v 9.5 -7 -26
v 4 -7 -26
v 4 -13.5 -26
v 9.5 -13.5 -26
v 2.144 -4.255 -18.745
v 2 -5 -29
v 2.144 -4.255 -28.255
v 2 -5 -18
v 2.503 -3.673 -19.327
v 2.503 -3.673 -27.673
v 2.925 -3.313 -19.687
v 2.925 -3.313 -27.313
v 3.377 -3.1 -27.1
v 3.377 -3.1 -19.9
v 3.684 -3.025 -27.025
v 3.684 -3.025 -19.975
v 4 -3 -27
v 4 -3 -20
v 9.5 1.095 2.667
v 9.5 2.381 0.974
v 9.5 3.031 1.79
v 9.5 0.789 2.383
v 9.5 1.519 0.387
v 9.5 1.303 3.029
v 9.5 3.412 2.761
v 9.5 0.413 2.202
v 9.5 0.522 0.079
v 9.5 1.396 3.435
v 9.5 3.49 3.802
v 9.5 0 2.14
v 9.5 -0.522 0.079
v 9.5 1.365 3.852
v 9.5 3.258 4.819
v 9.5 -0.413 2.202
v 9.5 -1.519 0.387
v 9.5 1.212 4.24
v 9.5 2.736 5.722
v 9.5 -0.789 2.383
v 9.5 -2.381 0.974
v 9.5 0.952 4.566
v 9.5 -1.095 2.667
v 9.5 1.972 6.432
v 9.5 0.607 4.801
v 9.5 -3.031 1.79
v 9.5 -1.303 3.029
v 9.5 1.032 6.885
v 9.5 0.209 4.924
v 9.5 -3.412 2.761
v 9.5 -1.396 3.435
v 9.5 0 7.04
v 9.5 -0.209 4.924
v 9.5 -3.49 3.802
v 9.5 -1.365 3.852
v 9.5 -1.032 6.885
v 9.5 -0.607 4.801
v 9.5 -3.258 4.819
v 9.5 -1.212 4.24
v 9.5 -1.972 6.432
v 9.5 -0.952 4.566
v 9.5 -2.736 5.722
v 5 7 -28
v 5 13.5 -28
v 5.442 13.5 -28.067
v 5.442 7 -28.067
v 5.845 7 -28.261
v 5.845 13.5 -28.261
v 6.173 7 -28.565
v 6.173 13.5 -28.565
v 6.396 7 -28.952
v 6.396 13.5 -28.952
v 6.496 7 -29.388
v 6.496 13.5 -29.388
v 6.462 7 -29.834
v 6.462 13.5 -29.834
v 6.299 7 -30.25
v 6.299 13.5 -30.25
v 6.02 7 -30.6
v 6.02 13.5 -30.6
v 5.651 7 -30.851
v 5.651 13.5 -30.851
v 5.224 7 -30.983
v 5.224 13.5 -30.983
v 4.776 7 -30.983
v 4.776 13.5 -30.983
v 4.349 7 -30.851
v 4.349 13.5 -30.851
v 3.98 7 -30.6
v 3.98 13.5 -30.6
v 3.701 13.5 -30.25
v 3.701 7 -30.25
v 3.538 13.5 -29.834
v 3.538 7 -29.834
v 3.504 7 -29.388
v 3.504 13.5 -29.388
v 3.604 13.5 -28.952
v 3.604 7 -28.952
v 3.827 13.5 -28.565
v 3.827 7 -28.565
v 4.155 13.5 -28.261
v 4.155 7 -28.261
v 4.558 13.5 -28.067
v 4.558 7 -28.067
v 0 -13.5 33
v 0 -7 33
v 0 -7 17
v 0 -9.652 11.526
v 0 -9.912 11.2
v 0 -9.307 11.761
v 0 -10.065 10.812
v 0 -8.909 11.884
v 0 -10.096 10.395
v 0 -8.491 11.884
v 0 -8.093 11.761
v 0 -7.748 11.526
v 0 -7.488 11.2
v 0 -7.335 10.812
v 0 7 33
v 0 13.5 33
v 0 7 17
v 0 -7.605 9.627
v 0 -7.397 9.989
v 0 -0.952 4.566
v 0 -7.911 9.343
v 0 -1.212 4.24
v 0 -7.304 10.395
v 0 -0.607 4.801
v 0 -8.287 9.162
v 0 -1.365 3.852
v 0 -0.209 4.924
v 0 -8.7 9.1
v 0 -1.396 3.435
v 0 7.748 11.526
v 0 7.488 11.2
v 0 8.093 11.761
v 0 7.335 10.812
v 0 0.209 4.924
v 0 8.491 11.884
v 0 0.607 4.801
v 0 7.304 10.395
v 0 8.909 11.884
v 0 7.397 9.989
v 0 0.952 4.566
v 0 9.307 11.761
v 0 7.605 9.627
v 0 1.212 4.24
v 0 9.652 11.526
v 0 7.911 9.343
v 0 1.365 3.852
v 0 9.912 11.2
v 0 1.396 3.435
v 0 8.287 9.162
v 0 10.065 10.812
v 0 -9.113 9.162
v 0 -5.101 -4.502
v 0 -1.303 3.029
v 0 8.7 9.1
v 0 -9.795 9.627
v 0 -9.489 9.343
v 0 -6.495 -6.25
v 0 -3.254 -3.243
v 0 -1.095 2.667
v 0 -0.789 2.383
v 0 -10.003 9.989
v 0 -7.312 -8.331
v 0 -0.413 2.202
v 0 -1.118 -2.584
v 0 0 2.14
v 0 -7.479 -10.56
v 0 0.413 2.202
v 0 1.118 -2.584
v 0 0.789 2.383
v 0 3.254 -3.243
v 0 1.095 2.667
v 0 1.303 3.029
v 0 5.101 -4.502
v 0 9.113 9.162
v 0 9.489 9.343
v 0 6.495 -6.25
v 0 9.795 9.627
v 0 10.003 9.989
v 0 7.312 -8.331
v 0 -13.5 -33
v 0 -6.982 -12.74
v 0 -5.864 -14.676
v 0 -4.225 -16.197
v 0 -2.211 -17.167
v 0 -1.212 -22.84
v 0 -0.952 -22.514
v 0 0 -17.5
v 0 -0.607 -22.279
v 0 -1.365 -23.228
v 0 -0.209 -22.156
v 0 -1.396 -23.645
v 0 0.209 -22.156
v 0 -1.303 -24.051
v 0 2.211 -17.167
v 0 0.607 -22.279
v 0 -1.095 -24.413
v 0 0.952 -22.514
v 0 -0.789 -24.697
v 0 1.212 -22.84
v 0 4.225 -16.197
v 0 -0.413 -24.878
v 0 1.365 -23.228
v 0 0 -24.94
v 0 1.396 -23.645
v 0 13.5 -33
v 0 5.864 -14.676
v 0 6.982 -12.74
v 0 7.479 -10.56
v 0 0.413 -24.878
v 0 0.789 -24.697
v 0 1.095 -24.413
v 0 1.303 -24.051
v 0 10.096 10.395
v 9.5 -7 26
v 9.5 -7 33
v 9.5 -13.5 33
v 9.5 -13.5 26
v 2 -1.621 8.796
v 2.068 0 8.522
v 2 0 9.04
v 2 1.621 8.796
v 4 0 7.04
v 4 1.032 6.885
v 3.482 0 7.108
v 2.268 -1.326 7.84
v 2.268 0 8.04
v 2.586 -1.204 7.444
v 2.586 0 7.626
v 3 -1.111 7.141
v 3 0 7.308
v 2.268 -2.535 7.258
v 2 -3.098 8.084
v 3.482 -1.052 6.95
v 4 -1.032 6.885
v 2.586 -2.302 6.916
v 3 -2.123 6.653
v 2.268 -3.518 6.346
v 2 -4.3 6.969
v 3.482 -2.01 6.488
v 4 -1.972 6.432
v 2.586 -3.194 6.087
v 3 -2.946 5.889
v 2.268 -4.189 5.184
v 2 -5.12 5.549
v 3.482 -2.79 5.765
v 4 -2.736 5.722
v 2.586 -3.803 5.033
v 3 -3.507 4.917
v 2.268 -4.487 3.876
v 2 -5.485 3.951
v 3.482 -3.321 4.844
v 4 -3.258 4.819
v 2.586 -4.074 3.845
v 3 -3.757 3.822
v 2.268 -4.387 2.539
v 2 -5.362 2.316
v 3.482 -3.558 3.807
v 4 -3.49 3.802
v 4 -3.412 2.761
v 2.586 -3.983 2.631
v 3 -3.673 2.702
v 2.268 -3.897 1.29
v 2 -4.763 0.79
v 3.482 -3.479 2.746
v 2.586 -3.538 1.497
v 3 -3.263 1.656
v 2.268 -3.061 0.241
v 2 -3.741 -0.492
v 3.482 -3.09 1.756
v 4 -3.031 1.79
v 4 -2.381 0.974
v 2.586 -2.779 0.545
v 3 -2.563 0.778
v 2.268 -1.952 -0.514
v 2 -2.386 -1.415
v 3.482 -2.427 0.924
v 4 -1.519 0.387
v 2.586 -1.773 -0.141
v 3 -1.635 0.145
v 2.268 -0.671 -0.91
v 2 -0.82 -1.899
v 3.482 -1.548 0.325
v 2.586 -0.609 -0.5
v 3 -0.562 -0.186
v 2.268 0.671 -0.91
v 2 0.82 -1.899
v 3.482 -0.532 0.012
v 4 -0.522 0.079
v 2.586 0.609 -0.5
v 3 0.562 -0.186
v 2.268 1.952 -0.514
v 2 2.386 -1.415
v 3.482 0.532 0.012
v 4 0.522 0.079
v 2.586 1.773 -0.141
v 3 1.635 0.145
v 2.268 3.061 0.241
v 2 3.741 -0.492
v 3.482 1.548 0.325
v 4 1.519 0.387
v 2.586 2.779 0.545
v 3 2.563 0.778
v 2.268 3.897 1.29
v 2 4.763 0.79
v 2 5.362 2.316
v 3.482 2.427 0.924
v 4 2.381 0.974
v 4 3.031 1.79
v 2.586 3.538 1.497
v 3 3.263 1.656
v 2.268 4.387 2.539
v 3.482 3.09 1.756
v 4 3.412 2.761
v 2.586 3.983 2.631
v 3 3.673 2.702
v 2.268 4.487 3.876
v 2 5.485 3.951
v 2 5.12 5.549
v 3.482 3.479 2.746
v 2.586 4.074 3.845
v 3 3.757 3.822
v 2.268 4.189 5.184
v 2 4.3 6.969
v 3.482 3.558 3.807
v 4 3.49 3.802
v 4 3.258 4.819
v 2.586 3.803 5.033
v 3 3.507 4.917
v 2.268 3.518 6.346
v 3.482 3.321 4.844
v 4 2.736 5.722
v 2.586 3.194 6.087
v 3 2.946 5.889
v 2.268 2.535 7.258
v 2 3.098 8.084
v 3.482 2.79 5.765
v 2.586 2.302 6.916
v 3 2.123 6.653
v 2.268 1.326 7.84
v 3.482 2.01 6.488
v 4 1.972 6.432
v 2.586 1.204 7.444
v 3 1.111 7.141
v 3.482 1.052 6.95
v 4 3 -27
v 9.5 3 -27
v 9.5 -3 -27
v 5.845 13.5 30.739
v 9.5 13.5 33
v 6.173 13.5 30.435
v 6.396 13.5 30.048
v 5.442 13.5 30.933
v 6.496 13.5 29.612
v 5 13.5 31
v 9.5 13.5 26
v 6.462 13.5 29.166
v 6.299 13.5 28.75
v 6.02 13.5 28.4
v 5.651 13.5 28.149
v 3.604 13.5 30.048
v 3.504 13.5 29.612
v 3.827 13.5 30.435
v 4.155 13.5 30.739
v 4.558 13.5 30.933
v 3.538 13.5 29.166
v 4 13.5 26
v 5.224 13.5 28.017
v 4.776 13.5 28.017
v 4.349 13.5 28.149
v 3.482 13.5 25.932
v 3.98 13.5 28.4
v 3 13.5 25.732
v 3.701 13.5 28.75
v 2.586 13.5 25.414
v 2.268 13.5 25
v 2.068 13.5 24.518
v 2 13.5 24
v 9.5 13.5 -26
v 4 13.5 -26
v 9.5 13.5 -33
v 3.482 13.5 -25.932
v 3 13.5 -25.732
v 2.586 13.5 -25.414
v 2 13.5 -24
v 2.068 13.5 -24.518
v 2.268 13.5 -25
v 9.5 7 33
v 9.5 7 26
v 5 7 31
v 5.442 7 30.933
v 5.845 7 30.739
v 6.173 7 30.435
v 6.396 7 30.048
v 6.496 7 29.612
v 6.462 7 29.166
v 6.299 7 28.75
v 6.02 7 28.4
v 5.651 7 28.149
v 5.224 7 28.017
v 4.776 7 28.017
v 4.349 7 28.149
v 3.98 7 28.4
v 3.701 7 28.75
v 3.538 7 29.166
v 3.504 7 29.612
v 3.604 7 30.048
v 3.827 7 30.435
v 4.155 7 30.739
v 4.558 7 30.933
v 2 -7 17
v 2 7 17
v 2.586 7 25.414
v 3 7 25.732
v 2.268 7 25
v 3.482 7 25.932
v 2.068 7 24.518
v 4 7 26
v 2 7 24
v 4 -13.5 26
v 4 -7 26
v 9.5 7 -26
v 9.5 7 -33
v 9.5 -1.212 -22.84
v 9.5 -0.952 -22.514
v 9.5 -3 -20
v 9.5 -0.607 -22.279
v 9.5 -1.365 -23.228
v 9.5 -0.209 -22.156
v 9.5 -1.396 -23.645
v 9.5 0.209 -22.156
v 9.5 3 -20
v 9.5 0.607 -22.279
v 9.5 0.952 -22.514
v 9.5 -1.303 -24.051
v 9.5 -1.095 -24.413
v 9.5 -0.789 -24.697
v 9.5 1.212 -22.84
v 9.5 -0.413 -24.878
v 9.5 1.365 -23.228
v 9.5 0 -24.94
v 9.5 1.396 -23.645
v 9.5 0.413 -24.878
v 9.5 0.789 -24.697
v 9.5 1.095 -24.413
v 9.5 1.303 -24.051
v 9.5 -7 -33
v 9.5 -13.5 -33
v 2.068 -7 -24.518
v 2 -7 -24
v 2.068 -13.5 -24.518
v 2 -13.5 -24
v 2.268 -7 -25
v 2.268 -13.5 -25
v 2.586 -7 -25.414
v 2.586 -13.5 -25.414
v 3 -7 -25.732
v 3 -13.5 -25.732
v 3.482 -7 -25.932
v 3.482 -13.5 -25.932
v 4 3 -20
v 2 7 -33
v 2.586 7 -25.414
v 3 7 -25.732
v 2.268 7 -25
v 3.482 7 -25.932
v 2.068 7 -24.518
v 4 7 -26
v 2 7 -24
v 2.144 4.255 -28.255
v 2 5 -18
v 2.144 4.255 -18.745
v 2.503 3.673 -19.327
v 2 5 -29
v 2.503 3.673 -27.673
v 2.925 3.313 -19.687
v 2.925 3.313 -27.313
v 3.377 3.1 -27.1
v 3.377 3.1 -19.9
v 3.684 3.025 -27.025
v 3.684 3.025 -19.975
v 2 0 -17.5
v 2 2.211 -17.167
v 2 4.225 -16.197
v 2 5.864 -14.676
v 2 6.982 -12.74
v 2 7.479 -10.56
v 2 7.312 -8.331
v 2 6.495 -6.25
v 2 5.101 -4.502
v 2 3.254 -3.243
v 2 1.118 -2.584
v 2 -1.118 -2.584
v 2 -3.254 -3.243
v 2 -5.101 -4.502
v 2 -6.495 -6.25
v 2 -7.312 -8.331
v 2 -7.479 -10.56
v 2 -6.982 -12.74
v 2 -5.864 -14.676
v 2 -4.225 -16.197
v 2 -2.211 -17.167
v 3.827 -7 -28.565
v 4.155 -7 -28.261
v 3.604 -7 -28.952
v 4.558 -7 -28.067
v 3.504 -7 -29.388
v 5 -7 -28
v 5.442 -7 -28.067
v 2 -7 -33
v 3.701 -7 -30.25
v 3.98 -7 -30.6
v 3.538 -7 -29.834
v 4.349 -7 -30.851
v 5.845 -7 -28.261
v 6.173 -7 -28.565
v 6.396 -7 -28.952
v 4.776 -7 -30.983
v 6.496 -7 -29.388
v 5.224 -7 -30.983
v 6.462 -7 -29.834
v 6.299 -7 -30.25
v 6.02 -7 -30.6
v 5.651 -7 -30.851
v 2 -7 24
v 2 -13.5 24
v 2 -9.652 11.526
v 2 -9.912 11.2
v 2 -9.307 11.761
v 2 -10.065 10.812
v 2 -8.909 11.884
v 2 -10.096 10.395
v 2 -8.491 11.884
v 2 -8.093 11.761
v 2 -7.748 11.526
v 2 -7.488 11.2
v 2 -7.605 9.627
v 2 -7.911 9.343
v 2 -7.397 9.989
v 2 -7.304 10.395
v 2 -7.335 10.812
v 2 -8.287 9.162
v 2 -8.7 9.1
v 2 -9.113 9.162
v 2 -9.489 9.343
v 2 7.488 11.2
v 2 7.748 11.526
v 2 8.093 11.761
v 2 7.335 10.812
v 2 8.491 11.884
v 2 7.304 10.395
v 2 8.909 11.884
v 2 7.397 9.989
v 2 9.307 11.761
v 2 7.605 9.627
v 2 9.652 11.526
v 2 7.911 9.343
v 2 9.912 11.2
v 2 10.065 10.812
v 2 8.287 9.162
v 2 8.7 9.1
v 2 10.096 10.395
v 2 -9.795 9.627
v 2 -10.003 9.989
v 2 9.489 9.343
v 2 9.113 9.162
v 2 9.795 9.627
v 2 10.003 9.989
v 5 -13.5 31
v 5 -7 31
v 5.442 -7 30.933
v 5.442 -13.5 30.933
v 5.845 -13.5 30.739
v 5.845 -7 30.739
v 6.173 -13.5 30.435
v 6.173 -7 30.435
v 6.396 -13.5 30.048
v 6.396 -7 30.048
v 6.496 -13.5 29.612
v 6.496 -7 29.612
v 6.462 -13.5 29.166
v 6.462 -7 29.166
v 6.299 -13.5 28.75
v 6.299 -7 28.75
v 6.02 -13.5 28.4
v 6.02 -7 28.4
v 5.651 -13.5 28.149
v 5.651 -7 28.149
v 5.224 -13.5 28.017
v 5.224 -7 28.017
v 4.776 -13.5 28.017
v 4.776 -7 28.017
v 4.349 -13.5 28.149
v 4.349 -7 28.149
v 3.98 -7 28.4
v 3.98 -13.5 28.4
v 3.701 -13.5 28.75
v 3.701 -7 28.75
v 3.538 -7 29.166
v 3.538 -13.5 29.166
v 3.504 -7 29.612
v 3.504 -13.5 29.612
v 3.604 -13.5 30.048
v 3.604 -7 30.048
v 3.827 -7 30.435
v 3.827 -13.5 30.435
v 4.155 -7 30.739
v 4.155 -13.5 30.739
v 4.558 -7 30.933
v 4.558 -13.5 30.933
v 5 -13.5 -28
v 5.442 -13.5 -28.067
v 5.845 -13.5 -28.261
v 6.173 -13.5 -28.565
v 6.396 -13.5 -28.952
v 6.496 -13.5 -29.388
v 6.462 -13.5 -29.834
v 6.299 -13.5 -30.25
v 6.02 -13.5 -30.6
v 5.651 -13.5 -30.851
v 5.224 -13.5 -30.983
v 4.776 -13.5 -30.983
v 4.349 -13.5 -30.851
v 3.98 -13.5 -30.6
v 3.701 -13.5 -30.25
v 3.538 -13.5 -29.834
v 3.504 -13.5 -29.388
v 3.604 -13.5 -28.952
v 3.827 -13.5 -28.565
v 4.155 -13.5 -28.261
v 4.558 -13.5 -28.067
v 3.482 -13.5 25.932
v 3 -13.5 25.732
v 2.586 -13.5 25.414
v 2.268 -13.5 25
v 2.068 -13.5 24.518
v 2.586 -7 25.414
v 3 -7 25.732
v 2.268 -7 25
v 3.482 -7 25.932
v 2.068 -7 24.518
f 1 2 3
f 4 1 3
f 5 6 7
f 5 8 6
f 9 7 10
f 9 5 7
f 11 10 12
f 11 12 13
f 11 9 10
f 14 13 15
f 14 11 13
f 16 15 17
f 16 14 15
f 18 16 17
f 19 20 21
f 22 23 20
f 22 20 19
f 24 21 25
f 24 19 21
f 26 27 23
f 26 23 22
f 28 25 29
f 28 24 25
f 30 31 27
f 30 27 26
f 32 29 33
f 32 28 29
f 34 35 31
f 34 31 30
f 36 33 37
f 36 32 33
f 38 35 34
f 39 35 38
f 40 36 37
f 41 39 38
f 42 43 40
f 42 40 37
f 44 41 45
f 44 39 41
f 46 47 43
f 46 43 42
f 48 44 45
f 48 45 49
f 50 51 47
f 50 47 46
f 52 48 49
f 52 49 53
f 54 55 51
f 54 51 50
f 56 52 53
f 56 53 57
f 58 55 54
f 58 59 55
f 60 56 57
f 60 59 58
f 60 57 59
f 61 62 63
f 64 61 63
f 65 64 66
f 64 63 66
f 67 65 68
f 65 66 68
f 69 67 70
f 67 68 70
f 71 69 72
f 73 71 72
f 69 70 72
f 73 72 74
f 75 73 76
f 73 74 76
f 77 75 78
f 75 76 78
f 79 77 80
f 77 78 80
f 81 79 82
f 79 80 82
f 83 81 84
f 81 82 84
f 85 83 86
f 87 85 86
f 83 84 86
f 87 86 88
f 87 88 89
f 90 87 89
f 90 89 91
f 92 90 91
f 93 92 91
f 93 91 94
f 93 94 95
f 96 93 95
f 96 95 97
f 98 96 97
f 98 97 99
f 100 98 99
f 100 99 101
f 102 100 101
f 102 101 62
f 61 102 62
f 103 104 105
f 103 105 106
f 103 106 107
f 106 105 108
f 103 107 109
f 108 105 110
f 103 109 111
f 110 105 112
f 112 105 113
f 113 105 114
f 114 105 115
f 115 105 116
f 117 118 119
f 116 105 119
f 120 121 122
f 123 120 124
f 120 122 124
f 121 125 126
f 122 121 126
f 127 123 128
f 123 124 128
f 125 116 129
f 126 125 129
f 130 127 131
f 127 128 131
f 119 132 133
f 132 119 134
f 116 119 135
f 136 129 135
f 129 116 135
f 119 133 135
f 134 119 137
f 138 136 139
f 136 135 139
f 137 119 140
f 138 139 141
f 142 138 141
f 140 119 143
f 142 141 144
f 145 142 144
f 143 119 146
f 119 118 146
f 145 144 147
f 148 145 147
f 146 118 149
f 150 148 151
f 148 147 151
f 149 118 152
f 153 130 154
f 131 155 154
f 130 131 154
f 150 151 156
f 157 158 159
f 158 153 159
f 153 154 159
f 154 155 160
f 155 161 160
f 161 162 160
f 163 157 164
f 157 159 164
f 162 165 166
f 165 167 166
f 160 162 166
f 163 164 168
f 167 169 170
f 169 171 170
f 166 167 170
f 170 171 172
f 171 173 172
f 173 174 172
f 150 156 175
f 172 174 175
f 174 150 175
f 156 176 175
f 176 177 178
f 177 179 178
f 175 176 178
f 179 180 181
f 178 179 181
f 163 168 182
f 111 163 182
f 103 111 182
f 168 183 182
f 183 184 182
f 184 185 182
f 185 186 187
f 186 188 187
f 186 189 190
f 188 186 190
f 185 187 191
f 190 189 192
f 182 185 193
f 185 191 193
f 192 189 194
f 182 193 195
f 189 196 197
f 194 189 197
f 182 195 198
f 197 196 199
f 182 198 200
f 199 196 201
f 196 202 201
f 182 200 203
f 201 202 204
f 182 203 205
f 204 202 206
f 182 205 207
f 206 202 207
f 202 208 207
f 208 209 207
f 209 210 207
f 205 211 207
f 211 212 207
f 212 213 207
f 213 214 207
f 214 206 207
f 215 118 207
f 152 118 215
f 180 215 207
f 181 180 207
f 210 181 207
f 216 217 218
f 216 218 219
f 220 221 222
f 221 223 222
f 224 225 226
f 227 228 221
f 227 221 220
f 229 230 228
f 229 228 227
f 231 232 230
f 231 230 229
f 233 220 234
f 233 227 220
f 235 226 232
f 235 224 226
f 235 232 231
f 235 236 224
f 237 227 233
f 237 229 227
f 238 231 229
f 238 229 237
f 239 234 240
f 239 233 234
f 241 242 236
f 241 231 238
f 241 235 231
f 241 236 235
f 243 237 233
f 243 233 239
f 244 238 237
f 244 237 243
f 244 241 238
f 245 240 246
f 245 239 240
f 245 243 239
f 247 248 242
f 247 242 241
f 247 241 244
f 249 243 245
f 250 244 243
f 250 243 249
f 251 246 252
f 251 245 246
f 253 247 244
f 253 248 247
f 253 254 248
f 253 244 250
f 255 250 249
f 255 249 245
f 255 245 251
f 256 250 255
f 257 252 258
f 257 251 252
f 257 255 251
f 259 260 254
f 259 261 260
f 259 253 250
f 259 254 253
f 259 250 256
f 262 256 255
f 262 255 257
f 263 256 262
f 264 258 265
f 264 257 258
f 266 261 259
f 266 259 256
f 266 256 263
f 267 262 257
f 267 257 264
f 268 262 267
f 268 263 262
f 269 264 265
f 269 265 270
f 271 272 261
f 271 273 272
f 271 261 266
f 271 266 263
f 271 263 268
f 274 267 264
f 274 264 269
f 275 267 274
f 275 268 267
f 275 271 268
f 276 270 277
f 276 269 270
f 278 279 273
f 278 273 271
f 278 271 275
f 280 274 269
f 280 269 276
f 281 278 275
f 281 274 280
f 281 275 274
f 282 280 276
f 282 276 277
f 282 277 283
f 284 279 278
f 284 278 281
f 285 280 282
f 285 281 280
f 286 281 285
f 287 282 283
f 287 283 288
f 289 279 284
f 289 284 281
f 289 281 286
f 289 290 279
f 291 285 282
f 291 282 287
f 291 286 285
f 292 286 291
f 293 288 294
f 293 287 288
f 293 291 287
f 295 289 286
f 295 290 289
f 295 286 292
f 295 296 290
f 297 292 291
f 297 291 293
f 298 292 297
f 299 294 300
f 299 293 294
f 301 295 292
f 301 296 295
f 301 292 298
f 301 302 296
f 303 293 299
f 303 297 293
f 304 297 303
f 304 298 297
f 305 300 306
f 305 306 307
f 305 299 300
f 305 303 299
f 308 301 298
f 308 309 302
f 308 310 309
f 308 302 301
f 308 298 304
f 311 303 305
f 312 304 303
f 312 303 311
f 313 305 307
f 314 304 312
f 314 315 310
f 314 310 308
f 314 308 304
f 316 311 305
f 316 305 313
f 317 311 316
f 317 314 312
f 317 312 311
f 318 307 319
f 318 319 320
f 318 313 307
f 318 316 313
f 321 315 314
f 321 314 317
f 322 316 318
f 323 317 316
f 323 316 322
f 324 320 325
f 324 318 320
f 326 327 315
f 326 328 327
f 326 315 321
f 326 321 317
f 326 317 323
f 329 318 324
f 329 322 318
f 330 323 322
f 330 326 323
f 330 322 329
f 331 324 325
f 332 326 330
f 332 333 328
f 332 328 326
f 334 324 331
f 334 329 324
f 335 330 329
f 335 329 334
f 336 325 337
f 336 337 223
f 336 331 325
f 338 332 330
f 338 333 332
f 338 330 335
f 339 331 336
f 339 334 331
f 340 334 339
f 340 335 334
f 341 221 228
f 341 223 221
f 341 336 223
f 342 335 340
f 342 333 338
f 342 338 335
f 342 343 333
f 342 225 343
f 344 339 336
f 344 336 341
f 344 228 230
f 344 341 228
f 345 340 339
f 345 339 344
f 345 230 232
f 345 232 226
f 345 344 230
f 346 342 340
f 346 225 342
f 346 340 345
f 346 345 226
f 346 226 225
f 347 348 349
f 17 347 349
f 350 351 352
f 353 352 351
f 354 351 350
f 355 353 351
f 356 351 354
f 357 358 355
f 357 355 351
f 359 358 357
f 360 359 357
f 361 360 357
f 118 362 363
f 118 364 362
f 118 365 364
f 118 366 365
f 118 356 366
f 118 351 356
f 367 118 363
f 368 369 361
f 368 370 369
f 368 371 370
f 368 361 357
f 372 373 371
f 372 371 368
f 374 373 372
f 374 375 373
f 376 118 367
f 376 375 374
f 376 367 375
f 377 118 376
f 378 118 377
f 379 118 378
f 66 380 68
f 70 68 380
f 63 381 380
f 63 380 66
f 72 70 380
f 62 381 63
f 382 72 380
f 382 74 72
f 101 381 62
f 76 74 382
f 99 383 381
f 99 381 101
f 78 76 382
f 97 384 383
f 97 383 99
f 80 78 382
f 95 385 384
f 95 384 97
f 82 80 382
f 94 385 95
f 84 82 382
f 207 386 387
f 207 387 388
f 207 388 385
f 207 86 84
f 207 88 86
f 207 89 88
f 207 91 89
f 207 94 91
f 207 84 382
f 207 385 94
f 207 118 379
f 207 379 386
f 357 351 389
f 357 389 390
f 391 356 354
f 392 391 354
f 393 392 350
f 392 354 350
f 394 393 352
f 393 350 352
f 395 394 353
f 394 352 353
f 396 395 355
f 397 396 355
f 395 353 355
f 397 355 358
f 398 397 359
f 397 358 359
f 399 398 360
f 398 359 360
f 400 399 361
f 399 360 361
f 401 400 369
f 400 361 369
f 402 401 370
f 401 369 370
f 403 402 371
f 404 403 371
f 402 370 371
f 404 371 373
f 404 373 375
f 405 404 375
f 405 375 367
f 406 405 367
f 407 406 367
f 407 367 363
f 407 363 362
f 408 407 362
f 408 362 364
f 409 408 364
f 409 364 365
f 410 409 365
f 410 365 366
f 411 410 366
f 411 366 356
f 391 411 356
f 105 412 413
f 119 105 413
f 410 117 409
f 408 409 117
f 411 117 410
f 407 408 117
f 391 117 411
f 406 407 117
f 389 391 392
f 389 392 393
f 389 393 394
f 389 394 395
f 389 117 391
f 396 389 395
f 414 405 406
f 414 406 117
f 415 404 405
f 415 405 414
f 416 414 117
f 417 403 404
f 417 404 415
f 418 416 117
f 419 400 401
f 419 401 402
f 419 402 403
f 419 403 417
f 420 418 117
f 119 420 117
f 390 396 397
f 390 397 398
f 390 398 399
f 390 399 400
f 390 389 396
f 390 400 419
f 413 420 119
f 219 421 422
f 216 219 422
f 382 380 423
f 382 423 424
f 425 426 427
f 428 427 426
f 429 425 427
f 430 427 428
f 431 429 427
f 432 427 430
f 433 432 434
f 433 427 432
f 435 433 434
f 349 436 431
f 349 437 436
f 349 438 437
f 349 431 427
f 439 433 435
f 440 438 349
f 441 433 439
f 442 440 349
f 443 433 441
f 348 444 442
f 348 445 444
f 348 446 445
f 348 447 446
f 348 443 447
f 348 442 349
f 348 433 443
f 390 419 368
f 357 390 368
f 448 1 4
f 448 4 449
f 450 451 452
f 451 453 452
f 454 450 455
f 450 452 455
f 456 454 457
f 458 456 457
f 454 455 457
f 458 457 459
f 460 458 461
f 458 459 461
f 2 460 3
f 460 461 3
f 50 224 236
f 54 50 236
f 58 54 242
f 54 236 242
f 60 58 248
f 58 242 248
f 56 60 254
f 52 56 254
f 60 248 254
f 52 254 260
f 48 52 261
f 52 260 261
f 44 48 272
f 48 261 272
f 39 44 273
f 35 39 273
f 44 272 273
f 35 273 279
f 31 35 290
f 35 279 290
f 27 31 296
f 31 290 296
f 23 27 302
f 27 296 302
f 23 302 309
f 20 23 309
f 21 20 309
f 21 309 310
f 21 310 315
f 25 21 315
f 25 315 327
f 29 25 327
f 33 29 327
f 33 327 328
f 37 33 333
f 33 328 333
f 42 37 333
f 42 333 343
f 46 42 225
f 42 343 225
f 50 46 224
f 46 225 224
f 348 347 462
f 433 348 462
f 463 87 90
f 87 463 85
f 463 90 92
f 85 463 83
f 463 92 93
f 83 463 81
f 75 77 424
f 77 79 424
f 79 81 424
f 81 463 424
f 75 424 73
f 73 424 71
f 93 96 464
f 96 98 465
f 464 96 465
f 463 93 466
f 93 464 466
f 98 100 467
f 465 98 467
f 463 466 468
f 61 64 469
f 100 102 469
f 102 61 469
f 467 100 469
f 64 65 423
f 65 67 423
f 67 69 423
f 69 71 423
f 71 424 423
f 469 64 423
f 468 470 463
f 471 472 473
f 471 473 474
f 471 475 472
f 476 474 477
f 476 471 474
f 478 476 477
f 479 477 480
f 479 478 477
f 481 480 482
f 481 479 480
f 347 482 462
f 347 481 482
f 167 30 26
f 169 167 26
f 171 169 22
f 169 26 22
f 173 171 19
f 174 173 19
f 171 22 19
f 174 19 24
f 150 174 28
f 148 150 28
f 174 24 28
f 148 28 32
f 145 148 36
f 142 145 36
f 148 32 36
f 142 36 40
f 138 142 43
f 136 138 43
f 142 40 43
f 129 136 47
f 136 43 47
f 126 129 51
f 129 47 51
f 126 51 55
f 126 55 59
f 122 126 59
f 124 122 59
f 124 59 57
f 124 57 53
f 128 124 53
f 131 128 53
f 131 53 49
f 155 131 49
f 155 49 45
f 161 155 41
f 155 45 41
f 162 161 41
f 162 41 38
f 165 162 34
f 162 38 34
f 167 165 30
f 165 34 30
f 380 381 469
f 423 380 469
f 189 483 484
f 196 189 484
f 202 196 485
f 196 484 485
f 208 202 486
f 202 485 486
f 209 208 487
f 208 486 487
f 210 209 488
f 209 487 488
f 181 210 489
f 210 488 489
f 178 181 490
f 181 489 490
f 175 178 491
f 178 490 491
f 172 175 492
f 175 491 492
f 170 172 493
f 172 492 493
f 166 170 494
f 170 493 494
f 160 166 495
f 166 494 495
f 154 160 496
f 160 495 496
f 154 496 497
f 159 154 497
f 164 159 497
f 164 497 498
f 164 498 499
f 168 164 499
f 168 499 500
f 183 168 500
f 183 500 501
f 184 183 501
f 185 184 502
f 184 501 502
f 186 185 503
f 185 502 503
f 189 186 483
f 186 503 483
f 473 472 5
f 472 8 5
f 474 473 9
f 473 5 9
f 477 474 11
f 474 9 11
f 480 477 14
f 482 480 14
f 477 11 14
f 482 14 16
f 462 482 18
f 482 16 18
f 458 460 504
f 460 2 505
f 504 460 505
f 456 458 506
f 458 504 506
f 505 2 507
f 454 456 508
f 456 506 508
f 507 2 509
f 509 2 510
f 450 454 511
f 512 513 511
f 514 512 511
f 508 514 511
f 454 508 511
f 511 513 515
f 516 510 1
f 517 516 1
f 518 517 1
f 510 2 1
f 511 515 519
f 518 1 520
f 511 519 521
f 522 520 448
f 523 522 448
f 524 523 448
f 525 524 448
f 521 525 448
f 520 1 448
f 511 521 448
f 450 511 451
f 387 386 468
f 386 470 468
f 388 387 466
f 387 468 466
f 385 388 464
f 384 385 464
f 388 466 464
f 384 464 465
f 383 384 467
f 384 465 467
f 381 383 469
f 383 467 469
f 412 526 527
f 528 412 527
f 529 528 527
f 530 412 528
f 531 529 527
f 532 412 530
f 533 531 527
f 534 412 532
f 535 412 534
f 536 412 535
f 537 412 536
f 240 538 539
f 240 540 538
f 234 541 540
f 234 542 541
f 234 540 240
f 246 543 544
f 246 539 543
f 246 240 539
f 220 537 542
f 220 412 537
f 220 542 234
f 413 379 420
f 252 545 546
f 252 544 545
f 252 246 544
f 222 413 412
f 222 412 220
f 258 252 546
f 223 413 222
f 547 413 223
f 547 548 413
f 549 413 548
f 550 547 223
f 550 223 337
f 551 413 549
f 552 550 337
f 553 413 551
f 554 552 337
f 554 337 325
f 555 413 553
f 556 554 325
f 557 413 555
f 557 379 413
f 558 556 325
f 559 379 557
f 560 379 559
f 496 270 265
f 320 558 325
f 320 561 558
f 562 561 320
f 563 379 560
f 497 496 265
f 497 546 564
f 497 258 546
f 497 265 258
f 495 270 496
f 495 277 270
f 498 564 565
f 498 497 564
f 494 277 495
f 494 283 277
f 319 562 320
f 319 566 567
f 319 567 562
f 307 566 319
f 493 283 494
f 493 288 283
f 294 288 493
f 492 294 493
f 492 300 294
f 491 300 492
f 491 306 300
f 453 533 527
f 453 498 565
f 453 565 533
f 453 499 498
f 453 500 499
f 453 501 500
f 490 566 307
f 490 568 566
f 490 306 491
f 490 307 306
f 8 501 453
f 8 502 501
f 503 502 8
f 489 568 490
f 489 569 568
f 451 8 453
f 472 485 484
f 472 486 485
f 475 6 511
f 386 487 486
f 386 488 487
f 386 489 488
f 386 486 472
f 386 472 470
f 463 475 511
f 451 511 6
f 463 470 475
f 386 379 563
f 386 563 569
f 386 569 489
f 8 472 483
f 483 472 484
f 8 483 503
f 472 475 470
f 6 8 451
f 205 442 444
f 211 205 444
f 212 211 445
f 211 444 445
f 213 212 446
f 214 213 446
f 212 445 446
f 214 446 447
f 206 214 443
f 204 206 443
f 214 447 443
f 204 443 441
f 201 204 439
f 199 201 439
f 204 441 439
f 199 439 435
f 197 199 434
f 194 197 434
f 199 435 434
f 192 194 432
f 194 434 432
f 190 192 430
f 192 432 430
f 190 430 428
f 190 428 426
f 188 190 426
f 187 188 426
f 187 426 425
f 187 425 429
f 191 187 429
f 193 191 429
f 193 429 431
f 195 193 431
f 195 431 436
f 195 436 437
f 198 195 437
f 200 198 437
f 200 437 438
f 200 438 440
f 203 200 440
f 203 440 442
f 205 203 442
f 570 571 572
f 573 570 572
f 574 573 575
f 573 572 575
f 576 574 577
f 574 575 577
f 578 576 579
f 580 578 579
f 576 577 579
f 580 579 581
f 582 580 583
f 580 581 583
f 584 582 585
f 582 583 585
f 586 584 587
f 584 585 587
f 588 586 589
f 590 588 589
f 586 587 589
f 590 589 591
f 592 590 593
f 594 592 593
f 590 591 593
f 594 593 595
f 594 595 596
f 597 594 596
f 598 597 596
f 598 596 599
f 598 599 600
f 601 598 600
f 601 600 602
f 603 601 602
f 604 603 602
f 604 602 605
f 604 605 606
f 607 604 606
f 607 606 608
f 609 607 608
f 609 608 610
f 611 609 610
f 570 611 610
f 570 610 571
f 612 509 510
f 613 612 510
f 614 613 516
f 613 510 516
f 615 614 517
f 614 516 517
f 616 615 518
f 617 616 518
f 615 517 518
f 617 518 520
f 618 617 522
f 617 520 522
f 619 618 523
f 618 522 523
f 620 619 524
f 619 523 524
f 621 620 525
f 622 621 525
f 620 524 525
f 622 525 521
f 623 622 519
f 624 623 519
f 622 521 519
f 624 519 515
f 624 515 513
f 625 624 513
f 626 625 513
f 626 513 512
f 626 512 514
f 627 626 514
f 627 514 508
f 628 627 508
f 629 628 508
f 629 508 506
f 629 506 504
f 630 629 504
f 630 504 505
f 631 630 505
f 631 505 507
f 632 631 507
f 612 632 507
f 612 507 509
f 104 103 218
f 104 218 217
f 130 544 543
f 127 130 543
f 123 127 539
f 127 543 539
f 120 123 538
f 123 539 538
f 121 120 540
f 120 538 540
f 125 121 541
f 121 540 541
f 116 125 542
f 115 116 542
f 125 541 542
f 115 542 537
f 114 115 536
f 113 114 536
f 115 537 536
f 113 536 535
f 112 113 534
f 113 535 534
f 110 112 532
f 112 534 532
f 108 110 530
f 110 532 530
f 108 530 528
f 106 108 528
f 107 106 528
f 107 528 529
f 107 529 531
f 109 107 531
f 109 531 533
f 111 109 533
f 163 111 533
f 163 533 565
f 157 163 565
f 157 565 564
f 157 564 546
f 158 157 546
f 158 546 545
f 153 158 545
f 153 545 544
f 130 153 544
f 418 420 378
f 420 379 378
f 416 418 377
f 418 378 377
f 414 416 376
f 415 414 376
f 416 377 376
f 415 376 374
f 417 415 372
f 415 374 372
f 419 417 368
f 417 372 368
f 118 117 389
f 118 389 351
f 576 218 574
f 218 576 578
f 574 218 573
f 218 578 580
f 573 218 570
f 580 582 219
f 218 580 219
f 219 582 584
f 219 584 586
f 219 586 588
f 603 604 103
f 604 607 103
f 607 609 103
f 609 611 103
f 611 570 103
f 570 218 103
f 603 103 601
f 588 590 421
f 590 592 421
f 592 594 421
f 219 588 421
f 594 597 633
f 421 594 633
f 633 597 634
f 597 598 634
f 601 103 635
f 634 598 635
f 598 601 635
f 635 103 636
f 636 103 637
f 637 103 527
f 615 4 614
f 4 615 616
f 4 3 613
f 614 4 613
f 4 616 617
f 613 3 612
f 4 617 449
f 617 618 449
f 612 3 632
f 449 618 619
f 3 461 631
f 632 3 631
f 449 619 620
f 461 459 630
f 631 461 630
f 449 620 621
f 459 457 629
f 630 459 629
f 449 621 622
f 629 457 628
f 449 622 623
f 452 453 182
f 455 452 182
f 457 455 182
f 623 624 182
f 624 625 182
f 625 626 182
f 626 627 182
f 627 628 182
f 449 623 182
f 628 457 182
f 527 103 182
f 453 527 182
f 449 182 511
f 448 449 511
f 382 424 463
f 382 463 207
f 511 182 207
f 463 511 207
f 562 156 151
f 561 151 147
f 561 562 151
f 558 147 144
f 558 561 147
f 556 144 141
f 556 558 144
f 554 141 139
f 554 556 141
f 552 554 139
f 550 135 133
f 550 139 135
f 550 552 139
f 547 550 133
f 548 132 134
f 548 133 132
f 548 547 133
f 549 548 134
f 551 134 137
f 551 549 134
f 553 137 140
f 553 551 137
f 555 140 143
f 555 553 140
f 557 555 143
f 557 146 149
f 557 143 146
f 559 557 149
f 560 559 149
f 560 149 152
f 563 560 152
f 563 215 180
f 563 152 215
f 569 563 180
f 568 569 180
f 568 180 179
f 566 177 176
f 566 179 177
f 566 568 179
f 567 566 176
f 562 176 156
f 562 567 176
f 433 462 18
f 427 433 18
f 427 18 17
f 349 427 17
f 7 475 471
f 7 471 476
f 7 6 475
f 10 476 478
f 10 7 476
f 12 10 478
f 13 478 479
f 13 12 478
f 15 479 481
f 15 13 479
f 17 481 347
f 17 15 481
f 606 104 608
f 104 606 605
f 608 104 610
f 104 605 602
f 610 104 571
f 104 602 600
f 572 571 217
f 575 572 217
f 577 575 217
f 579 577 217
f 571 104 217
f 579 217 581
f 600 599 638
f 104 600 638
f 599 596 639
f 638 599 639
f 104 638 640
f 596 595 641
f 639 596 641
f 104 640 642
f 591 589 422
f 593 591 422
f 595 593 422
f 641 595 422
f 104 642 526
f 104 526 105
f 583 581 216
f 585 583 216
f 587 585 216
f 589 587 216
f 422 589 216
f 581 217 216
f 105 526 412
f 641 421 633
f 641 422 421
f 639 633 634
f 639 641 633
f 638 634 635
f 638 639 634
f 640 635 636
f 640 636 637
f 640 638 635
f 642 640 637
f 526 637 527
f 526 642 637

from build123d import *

# Parameters (mm, degrees)
SKETCH1_W           = 66
SKETCH1_H           = 27
BOSS_EXTRUDE1_DEPTH = 2
SKETCH2_R           = 7.5
CUT_EXTRUDE1_DEPTH  = 2
BOSS_EXTRUDE2_DEPTH = 7.5
SKETCH4_R           = 1.5
CUT_EXTRUDE2_DEPTH  = 31
SKETCH5_R           = 1.4
CUT_EXTRUDE3_DEPTH  = 31
SKETCH6_W           = 7
SKETCH6_H           = 27
BOSS_EXTRUDE3_DEPTH = 7.5
SKETCH7_R           = 1.5
CUT_EXTRUDE4_DEPTH  = 33.5
SKETCH8_W           = 16
SKETCH8_H           = 14
CUT_EXTRUDE5_DEPTH  = 15.75
SKETCH9_R           = 1.4
CUT_EXTRUDE6_DEPTH  = 31.5
SKETCH10_R          = 3.5
BOSS_EXTRUDE4_DEPTH = 7.5
SKETCH11_R          = 1.4
CUT_EXTRUDE7_DEPTH  = 9.5
CUT_EXTRUDE8_DEPTH  = 7.5
FILLET1_R           = 2


with BuildPart() as part:
    # Sketch1 → Boss-Extrude1 (new body)
    with BuildSketch(Plane(origin=(0, 0, 0), x_dir=(0, 0, -1), z_dir=(1, 0, 0))):
        Rectangle(SKETCH1_W, SKETCH1_H)
    extrude(amount=BOSS_EXTRUDE1_DEPTH)

    # Sketch2 → Cut-Extrude1 (cut)
    with BuildSketch(Plane(origin=(2, 0, 0), x_dir=(0, 0, -1), z_dir=(1, 0, 0))):
        with Locations((10, 0)):
            Circle(SKETCH2_R)
    extrude(amount=-CUT_EXTRUDE1_DEPTH, mode=Mode.SUBTRACT)

    # Sketch3 → Boss-Extrude2 (add)
    with BuildSketch(Plane(origin=(2, 0, 0), x_dir=(0, 0, -1), z_dir=(1, 0, 0))):
        Polygon((33, 13.5), (26, 13.5), (26, 3), (20, 3), (20, -3), (26, -3), (26, -13.5), (33, -13.5), align=None)
    extrude(amount=BOSS_EXTRUDE2_DEPTH)

    # Sketch4 → Cut-Extrude2 (cut)
    with BuildSketch(Plane(origin=(0, 13.5, 0), x_dir=(1, 0, 0), z_dir=(0, 1, 0))):
        with Locations(Location((5, 29.5, 0), (0, 0, 270))):
            Circle(SKETCH4_R)
    extrude(amount=-CUT_EXTRUDE2_DEPTH, mode=Mode.SUBTRACT)

    # Sketch5 → Cut-Extrude3 (cut)
    with BuildSketch(Plane(origin=(9.5, 0, 0), x_dir=(0, 0, -1), z_dir=(1, 0, 0))):
        with Locations((23.54, 0)):
            Circle(SKETCH5_R)
    extrude(amount=-CUT_EXTRUDE3_DEPTH, mode=Mode.SUBTRACT)

    # Sketch6 → Boss-Extrude3 (add)
    with BuildSketch(Plane(origin=(2, 0, 0), x_dir=(0, 0, -1), z_dir=(1, 0, 0))):
        with Locations((-29.5, 0)):
            Rectangle(SKETCH6_W, SKETCH6_H)
    extrude(amount=BOSS_EXTRUDE3_DEPTH)

    # Sketch7 → Cut-Extrude4 (cut)
    with BuildSketch(Plane(origin=(0, 13.5, 0), x_dir=(1, 0, 0), z_dir=(0, 1, 0))):
        with Locations(Location((5, -29.5, 0), (0, 0, 270))):
            Circle(SKETCH7_R)
    extrude(amount=-CUT_EXTRUDE4_DEPTH, mode=Mode.SUBTRACT)

    # Sketch8 → Cut-Extrude5 (cut, symmetric)
    with BuildSketch(Plane(origin=(2, 0, 0), x_dir=(0, 0, -1), z_dir=(1, 0, 0))):
        with Locations((-25, 0)):
            Rectangle(SKETCH8_W, SKETCH8_H)
    extrude(amount=CUT_EXTRUDE5_DEPTH, both=True, mode=Mode.SUBTRACT)

    # Sketch9 → Cut-Extrude6 (cut)
    with BuildSketch(Plane(origin=(2, 0, 0), x_dir=(0, 0, -1), z_dir=(1, 0, 0))):
        with Locations((-10.5, -8.7)):
            Circle(SKETCH9_R)
    cut_extrude6 = extrude(amount=-CUT_EXTRUDE6_DEPTH, mode=Mode.SUBTRACT)

    # Mirror1: Cut-Extrude6 across plane
    add(cut_extrude6.mirror(Plane.ZX), mode=Mode.SUBTRACT)

    # Sketch10 → Boss-Extrude4 (add)
    with BuildSketch(Plane(origin=(2, 0, 0), x_dir=(0, 0, -1), z_dir=(1, 0, 0))):
        with Locations(Location((-3.54, 0, 0), (0, 0, 180))):
            Circle(SKETCH10_R)
    extrude(amount=BOSS_EXTRUDE4_DEPTH)

    # Sketch11 → Cut-Extrude7 (cut)
    with BuildSketch(Plane(origin=(9.5, 0, 0), x_dir=(0, 0, -1), z_dir=(1, 0, 0))):
        with Locations((-3.54, 0)):
            Circle(SKETCH11_R)
    extrude(amount=-CUT_EXTRUDE7_DEPTH, mode=Mode.SUBTRACT)

    # Sketch12 → Cut-Extrude8 (cut)
    with BuildSketch(Plane(origin=(9.5, 0, 0), x_dir=(0, 0, -1), z_dir=(1, 0, 0))):
        Polygon((26, -7), (33, -7), (33, -3), (33, 3), (33, 7), (26, 7), (26, 3), (27, 3), (27, -3), (26, -3), align=None)
    extrude(amount=-CUT_EXTRUDE8_DEPTH, mode=Mode.SUBTRACT)

    # Fillet1
    fillet1_edges = [part.edges().sort_by_distance(p)[0] for p in [
        (2, 0, 0.04),
        (2, -10.25, 26),
        (2, -10.25, -26),
        (2, 0, -20),
        (2, -3, -23.5),
        (2, 3, -23.5),
        (2, 10.25, -26),
        (2, 10.25, 26),
        (2, 0, -27),
    ]]
    fillet(fillet1_edges, radius=FILLET1_R)


solid = part.part
